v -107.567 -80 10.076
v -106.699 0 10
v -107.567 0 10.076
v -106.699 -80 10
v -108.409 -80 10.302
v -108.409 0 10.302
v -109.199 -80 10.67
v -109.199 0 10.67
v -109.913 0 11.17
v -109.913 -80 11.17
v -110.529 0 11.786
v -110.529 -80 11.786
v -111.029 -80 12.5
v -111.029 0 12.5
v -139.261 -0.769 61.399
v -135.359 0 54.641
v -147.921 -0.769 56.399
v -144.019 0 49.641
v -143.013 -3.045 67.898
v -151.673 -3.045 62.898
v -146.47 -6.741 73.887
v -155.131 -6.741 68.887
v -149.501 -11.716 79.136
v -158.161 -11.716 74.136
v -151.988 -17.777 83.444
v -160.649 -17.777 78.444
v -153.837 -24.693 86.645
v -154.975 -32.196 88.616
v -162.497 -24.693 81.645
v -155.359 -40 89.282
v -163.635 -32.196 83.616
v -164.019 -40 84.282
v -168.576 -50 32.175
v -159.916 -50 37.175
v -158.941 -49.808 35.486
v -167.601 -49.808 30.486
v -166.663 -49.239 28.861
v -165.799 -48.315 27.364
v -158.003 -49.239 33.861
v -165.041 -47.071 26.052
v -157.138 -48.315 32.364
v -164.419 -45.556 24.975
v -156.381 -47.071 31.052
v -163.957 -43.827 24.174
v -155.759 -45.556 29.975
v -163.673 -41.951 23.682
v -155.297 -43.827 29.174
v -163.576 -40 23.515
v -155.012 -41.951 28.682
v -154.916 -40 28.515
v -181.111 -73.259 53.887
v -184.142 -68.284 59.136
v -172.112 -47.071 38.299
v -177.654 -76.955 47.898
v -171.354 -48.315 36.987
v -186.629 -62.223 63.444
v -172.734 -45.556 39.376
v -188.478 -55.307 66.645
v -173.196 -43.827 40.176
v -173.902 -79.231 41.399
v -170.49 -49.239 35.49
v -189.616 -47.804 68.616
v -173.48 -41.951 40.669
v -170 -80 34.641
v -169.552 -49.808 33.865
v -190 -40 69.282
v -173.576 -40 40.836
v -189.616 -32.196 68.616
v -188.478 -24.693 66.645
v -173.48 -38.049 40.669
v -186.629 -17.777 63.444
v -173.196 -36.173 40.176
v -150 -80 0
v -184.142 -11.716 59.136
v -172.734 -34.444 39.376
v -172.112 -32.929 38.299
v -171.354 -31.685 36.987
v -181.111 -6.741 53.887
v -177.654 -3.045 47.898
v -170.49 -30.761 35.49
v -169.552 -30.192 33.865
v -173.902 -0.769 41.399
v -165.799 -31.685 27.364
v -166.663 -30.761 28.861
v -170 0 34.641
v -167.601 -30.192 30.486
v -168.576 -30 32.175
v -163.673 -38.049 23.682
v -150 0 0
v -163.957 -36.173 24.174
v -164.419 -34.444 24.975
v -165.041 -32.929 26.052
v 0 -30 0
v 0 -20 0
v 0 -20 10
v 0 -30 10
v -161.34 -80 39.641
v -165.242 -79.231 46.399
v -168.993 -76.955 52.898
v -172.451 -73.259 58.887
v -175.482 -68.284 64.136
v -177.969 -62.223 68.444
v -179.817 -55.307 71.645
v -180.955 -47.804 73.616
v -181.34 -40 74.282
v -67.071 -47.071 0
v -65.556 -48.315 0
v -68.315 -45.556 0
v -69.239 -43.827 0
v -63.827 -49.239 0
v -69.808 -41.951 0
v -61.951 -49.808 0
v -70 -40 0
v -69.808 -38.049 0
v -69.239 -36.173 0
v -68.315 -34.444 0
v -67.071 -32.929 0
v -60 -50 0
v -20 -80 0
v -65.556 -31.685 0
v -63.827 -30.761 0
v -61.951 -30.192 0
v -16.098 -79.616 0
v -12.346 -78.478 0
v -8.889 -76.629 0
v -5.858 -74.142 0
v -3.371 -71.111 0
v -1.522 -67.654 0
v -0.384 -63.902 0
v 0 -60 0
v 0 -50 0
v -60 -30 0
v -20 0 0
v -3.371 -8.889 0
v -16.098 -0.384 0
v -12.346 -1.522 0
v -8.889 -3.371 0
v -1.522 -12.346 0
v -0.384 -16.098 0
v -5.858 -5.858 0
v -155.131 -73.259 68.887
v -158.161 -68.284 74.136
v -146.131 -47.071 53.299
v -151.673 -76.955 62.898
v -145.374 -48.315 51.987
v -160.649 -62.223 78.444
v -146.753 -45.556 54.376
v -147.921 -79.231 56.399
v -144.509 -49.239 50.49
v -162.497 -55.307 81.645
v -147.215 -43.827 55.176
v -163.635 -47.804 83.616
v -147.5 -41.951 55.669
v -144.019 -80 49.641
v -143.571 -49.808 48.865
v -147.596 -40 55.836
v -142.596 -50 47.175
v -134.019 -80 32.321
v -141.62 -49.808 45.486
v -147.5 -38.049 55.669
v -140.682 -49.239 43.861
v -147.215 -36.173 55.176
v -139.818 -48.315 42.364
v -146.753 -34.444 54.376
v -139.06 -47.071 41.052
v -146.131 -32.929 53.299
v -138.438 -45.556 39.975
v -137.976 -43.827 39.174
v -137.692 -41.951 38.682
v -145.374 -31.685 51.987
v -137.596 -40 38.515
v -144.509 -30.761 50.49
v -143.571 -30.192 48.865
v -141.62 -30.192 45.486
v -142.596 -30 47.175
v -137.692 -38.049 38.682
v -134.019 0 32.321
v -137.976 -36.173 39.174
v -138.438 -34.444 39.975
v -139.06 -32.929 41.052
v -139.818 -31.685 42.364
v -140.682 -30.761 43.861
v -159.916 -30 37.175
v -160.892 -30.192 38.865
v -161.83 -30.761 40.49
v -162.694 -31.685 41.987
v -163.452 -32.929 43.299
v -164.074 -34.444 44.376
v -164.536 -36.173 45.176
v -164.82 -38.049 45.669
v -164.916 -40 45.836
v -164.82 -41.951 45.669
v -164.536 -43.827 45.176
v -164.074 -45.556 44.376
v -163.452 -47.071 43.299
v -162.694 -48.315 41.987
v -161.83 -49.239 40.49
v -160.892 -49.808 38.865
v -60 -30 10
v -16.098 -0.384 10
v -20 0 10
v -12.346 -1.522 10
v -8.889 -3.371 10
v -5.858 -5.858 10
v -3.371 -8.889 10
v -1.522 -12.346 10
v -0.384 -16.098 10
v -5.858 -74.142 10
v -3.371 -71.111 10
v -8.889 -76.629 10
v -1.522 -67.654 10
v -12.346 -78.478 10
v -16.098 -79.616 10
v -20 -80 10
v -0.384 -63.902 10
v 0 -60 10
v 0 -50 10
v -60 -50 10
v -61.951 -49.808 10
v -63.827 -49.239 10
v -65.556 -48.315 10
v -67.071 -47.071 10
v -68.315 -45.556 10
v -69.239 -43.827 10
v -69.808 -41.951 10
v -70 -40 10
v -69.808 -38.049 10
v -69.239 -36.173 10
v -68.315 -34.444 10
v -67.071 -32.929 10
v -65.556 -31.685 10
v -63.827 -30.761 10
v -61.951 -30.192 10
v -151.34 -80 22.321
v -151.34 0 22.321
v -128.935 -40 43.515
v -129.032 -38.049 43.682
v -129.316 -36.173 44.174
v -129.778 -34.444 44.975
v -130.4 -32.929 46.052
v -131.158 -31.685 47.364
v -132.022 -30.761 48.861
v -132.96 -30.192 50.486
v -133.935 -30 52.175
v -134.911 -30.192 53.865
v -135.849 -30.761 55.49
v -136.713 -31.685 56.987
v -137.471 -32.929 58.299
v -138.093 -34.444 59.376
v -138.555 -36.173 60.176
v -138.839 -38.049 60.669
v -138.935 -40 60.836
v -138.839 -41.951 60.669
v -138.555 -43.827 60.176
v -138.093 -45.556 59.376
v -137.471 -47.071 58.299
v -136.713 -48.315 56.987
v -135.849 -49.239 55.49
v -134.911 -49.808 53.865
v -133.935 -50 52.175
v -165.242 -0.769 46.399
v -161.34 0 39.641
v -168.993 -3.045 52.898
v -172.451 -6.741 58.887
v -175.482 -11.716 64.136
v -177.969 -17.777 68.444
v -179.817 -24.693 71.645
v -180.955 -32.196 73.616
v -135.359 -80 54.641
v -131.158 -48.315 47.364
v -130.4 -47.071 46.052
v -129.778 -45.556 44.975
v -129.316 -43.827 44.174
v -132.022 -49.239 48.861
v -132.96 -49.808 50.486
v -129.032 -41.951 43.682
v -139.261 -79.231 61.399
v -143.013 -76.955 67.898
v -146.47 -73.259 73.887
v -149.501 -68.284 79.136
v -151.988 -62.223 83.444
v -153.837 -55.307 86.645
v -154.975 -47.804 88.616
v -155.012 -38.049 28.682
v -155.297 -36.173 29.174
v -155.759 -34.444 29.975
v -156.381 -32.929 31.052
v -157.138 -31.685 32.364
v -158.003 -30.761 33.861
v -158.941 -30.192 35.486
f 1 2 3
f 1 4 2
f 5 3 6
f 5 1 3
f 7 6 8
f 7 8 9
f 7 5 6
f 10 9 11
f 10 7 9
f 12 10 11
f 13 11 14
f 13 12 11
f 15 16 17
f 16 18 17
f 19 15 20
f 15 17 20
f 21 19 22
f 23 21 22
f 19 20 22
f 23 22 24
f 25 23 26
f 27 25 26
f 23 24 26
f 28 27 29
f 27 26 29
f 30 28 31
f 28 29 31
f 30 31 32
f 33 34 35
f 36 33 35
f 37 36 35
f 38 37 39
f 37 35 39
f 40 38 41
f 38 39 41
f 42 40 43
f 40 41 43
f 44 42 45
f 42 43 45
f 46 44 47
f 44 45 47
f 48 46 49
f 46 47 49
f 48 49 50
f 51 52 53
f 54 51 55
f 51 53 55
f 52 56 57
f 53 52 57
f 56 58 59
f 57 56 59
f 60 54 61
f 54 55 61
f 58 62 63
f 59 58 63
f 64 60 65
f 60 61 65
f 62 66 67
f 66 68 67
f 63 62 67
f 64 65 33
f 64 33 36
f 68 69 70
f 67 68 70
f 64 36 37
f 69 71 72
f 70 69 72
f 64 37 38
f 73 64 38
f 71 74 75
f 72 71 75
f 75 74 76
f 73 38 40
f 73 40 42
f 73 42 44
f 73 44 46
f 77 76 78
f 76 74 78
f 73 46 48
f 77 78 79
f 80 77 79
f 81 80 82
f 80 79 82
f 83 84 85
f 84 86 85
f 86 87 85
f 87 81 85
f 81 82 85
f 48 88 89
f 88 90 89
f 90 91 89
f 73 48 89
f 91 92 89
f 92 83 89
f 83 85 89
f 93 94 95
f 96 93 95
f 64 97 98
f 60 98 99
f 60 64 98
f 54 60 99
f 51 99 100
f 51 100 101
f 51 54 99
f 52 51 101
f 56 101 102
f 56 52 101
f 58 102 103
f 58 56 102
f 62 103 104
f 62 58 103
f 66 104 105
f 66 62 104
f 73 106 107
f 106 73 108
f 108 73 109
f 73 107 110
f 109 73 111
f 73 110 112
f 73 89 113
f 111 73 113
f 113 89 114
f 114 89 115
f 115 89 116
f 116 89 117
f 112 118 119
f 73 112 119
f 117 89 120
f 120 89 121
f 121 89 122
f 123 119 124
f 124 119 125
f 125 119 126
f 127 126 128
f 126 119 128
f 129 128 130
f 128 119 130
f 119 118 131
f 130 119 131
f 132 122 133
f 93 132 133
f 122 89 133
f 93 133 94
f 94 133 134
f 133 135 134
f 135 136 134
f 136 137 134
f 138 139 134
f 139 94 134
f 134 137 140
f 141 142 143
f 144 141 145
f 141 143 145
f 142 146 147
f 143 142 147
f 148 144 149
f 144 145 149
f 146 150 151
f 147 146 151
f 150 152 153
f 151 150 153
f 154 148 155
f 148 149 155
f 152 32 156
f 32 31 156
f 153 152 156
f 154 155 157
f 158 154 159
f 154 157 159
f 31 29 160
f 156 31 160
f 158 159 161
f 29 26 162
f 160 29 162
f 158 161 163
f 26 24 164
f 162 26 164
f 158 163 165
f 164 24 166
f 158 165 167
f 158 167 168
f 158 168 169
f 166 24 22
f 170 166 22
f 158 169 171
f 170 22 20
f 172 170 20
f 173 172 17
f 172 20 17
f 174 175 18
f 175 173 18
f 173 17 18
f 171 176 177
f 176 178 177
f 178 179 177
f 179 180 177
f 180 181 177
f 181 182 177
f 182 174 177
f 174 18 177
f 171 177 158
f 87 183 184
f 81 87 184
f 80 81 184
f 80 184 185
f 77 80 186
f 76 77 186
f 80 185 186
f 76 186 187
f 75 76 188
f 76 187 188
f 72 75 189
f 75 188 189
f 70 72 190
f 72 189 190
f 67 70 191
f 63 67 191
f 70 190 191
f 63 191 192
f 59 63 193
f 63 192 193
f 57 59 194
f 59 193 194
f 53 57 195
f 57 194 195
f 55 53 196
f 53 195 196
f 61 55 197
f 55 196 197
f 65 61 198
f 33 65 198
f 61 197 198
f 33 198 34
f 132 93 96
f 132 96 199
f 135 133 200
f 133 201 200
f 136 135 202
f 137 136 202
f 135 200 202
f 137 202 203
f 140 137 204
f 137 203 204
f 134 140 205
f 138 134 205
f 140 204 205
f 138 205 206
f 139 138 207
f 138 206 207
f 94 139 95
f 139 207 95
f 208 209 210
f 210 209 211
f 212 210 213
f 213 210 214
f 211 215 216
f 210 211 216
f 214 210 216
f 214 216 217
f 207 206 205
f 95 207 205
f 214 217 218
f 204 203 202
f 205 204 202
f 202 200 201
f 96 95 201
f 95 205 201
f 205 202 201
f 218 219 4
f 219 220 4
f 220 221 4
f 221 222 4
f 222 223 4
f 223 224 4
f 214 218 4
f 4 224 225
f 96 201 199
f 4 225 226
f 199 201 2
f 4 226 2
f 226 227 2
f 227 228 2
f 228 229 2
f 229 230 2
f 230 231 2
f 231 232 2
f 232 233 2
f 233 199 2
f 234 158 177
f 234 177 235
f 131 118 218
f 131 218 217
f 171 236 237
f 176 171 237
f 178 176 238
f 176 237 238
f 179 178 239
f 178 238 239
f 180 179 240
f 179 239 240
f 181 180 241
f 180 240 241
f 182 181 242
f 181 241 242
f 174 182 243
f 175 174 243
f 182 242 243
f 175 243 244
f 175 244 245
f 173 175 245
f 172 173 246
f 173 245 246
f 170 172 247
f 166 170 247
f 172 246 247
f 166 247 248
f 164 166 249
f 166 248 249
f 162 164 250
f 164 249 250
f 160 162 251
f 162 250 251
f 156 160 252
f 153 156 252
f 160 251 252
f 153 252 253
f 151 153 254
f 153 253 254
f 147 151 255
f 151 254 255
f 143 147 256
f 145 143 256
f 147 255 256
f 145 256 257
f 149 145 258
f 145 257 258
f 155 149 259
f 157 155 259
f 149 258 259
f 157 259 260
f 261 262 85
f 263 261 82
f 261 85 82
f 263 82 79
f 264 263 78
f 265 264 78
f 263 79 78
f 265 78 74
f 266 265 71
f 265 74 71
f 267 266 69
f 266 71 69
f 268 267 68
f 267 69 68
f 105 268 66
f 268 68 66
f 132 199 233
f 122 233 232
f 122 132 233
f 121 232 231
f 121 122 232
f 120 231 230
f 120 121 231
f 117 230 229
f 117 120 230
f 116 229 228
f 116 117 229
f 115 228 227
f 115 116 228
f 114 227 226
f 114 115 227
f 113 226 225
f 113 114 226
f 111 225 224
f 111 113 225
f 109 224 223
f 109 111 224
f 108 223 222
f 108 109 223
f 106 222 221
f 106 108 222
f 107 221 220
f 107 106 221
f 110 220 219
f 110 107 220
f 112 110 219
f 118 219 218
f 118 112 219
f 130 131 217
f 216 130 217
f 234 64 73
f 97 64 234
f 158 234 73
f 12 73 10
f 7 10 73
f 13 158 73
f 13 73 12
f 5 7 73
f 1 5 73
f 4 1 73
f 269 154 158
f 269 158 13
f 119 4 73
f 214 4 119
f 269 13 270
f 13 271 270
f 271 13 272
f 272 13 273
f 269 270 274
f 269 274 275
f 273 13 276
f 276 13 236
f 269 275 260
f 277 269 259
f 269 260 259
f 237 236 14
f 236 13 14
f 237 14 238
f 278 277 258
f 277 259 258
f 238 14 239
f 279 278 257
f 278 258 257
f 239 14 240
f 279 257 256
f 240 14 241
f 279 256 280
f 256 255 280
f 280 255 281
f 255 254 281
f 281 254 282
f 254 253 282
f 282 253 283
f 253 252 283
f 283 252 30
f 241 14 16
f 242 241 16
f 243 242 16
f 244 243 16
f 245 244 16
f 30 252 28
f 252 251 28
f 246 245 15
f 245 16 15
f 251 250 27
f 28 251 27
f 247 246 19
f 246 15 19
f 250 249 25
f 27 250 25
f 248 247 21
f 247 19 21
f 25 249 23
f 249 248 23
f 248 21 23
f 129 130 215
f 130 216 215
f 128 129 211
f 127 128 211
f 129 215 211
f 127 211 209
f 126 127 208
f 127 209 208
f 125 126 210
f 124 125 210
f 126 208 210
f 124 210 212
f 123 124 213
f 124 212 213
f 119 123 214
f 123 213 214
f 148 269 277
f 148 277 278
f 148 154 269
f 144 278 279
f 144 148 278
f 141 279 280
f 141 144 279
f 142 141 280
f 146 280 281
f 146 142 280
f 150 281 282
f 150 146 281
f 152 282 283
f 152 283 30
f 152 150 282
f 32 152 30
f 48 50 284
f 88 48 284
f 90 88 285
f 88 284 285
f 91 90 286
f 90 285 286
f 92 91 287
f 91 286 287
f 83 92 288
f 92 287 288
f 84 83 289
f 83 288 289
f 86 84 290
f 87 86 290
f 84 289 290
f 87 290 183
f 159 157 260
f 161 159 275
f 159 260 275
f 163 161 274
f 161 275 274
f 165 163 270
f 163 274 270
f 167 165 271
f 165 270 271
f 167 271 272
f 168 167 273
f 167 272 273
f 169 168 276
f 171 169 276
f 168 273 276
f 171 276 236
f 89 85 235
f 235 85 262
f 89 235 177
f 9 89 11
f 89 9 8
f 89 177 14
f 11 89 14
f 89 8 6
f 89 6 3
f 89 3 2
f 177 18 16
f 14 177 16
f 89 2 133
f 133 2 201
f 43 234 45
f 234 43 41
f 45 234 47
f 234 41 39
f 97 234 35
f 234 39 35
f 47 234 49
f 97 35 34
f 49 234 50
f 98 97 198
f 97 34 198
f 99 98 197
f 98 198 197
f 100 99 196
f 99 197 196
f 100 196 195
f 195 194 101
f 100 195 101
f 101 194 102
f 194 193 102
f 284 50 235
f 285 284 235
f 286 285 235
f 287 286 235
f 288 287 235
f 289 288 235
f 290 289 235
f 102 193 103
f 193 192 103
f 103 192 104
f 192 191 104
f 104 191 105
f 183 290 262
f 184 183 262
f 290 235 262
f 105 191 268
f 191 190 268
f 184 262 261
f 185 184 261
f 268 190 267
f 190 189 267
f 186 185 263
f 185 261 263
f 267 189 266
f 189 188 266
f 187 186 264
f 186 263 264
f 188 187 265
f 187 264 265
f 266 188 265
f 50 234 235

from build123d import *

# Parameters (mm, degrees)
F1_DEPTH = 80
F3_DEPTH = 27.9
F4_R     = 20
F6_R     = 39.99999
F7_R     = 5
F8_DEPTH = 148.2


# Not quite as in the source:
# - a fillet or chamfer is up to 0.001 mm smaller than in the source, because OpenCascade refuses the exact size


with BuildPart() as f1:
    # F0 (on Front) → F1 (new body)
    with BuildSketch(Plane.XZ):
        Polygon((-150, 0), (0, 0), (0, 10), (-109.5854811567, 10), (-155.3589838486, 89.2820323028), (-164.0192378865, 84.2820323028), (-134.0192378865, 32.3205080757), (-151.3397459622, 22.3205080757), (-181.3397459622, 74.2820323028), (-190, 69.2820323028), align=None)
    extrude(amount=F1_DEPTH)

    # F2 (on Top) → F3 (cut)
    with BuildSketch(Plane.XY):
        with BuildLine():
            Line((-60, -40), (-60, -30))
            ThreePointArc((-60, -30), (-70, -40), (-60, -50))
            Line((-60, -50), (-60, -40))
        make_face()
        with BuildLine():
            ThreePointArc((-50, -40), (-52.9289321881, -32.9289321881), (-60, -30))
            Line((-60, -30), (-60, -40))
            Line((-60, -40), (-50, -40))
        make_face()
        with BuildLine():
            ThreePointArc((-60, -50), (-52.9289321881, -47.0710678119), (-50, -40))
            Line((-50, -40), (-60, -40))
            Line((-60, -40), (-60, -50))
        make_face()
        with BuildLine():
            Line((0, -50), (0, -40))
            Line((0, -40), (-50, -40))
            ThreePointArc((-50, -40), (-52.9289321881, -47.0710678119), (-60, -50))
            Line((-60, -50), (0, -50))
        make_face()
        with BuildLine():
            Line((0, -40), (0, -30))
            Line((0, -30), (-60, -30))
            ThreePointArc((-60, -30), (-52.9289321881, -32.9289321881), (-50, -40))
            Line((-50, -40), (0, -40))
        make_face()
    extrude(amount=F3_DEPTH, mode=Mode.SUBTRACT)

    # F4
    f4_edges = [f1.edges().sort_by_distance(p)[0] for p in [
        (0, 0, 5),
        (0, -80, 5),
    ]]
    fillet(f4_edges, radius=F4_R)

    # F6 (radius 40 in the source; OpenCascade refuses exactly that, so slightly less here)
    f6_edges = [f1.edges().sort_by_distance(p)[0] for p in [
        (-159.689111, 0, 86.782032),
        (-185.669873, 0, 71.782032),
        (-185.669873, -80, 71.782032),
        (-159.689111, -80, 86.782032),
    ]]
    fillet(f6_edges, radius=F6_R)

    # F7
    f7_edges = [f1.edges().sort_by_distance(p)[0] for p in [
        (-109.585481, -40, 10),
    ]]
    fillet(f7_edges, radius=F7_R)

    # F5 (on face) → F8 (cut)
    with BuildSketch(Plane(origin=(-77.8589838486, 0, -44.9519052838), x_dir=(0, 1, 0), z_dir=(0.8660254038, 0, 0.5))):
        with BuildLine():
            Line((-40, 112.1529946162), (-40, 102.1529946162))
            ThreePointArc((-40, 102.1529946162), (-32.9289321881, 105.0819268043), (-30, 112.1529946162))
            ThreePointArc((-30, 112.1529946162), (-40, 122.1529946162), (-50, 112.1529946162))
            Line((-50, 112.1529946162), (-40, 112.1529946162))
        make_face()
        with BuildLine():
            ThreePointArc((-50, 112.1529946162), (-47.0710678119, 105.0819268043), (-40, 102.1529946162))
            Line((-40, 102.1529946162), (-40, 112.1529946162))
            Line((-40, 112.1529946162), (-50, 112.1529946162))
        make_face()
    extrude(amount=-F8_DEPTH, mode=Mode.SUBTRACT)


solid = f1.part
